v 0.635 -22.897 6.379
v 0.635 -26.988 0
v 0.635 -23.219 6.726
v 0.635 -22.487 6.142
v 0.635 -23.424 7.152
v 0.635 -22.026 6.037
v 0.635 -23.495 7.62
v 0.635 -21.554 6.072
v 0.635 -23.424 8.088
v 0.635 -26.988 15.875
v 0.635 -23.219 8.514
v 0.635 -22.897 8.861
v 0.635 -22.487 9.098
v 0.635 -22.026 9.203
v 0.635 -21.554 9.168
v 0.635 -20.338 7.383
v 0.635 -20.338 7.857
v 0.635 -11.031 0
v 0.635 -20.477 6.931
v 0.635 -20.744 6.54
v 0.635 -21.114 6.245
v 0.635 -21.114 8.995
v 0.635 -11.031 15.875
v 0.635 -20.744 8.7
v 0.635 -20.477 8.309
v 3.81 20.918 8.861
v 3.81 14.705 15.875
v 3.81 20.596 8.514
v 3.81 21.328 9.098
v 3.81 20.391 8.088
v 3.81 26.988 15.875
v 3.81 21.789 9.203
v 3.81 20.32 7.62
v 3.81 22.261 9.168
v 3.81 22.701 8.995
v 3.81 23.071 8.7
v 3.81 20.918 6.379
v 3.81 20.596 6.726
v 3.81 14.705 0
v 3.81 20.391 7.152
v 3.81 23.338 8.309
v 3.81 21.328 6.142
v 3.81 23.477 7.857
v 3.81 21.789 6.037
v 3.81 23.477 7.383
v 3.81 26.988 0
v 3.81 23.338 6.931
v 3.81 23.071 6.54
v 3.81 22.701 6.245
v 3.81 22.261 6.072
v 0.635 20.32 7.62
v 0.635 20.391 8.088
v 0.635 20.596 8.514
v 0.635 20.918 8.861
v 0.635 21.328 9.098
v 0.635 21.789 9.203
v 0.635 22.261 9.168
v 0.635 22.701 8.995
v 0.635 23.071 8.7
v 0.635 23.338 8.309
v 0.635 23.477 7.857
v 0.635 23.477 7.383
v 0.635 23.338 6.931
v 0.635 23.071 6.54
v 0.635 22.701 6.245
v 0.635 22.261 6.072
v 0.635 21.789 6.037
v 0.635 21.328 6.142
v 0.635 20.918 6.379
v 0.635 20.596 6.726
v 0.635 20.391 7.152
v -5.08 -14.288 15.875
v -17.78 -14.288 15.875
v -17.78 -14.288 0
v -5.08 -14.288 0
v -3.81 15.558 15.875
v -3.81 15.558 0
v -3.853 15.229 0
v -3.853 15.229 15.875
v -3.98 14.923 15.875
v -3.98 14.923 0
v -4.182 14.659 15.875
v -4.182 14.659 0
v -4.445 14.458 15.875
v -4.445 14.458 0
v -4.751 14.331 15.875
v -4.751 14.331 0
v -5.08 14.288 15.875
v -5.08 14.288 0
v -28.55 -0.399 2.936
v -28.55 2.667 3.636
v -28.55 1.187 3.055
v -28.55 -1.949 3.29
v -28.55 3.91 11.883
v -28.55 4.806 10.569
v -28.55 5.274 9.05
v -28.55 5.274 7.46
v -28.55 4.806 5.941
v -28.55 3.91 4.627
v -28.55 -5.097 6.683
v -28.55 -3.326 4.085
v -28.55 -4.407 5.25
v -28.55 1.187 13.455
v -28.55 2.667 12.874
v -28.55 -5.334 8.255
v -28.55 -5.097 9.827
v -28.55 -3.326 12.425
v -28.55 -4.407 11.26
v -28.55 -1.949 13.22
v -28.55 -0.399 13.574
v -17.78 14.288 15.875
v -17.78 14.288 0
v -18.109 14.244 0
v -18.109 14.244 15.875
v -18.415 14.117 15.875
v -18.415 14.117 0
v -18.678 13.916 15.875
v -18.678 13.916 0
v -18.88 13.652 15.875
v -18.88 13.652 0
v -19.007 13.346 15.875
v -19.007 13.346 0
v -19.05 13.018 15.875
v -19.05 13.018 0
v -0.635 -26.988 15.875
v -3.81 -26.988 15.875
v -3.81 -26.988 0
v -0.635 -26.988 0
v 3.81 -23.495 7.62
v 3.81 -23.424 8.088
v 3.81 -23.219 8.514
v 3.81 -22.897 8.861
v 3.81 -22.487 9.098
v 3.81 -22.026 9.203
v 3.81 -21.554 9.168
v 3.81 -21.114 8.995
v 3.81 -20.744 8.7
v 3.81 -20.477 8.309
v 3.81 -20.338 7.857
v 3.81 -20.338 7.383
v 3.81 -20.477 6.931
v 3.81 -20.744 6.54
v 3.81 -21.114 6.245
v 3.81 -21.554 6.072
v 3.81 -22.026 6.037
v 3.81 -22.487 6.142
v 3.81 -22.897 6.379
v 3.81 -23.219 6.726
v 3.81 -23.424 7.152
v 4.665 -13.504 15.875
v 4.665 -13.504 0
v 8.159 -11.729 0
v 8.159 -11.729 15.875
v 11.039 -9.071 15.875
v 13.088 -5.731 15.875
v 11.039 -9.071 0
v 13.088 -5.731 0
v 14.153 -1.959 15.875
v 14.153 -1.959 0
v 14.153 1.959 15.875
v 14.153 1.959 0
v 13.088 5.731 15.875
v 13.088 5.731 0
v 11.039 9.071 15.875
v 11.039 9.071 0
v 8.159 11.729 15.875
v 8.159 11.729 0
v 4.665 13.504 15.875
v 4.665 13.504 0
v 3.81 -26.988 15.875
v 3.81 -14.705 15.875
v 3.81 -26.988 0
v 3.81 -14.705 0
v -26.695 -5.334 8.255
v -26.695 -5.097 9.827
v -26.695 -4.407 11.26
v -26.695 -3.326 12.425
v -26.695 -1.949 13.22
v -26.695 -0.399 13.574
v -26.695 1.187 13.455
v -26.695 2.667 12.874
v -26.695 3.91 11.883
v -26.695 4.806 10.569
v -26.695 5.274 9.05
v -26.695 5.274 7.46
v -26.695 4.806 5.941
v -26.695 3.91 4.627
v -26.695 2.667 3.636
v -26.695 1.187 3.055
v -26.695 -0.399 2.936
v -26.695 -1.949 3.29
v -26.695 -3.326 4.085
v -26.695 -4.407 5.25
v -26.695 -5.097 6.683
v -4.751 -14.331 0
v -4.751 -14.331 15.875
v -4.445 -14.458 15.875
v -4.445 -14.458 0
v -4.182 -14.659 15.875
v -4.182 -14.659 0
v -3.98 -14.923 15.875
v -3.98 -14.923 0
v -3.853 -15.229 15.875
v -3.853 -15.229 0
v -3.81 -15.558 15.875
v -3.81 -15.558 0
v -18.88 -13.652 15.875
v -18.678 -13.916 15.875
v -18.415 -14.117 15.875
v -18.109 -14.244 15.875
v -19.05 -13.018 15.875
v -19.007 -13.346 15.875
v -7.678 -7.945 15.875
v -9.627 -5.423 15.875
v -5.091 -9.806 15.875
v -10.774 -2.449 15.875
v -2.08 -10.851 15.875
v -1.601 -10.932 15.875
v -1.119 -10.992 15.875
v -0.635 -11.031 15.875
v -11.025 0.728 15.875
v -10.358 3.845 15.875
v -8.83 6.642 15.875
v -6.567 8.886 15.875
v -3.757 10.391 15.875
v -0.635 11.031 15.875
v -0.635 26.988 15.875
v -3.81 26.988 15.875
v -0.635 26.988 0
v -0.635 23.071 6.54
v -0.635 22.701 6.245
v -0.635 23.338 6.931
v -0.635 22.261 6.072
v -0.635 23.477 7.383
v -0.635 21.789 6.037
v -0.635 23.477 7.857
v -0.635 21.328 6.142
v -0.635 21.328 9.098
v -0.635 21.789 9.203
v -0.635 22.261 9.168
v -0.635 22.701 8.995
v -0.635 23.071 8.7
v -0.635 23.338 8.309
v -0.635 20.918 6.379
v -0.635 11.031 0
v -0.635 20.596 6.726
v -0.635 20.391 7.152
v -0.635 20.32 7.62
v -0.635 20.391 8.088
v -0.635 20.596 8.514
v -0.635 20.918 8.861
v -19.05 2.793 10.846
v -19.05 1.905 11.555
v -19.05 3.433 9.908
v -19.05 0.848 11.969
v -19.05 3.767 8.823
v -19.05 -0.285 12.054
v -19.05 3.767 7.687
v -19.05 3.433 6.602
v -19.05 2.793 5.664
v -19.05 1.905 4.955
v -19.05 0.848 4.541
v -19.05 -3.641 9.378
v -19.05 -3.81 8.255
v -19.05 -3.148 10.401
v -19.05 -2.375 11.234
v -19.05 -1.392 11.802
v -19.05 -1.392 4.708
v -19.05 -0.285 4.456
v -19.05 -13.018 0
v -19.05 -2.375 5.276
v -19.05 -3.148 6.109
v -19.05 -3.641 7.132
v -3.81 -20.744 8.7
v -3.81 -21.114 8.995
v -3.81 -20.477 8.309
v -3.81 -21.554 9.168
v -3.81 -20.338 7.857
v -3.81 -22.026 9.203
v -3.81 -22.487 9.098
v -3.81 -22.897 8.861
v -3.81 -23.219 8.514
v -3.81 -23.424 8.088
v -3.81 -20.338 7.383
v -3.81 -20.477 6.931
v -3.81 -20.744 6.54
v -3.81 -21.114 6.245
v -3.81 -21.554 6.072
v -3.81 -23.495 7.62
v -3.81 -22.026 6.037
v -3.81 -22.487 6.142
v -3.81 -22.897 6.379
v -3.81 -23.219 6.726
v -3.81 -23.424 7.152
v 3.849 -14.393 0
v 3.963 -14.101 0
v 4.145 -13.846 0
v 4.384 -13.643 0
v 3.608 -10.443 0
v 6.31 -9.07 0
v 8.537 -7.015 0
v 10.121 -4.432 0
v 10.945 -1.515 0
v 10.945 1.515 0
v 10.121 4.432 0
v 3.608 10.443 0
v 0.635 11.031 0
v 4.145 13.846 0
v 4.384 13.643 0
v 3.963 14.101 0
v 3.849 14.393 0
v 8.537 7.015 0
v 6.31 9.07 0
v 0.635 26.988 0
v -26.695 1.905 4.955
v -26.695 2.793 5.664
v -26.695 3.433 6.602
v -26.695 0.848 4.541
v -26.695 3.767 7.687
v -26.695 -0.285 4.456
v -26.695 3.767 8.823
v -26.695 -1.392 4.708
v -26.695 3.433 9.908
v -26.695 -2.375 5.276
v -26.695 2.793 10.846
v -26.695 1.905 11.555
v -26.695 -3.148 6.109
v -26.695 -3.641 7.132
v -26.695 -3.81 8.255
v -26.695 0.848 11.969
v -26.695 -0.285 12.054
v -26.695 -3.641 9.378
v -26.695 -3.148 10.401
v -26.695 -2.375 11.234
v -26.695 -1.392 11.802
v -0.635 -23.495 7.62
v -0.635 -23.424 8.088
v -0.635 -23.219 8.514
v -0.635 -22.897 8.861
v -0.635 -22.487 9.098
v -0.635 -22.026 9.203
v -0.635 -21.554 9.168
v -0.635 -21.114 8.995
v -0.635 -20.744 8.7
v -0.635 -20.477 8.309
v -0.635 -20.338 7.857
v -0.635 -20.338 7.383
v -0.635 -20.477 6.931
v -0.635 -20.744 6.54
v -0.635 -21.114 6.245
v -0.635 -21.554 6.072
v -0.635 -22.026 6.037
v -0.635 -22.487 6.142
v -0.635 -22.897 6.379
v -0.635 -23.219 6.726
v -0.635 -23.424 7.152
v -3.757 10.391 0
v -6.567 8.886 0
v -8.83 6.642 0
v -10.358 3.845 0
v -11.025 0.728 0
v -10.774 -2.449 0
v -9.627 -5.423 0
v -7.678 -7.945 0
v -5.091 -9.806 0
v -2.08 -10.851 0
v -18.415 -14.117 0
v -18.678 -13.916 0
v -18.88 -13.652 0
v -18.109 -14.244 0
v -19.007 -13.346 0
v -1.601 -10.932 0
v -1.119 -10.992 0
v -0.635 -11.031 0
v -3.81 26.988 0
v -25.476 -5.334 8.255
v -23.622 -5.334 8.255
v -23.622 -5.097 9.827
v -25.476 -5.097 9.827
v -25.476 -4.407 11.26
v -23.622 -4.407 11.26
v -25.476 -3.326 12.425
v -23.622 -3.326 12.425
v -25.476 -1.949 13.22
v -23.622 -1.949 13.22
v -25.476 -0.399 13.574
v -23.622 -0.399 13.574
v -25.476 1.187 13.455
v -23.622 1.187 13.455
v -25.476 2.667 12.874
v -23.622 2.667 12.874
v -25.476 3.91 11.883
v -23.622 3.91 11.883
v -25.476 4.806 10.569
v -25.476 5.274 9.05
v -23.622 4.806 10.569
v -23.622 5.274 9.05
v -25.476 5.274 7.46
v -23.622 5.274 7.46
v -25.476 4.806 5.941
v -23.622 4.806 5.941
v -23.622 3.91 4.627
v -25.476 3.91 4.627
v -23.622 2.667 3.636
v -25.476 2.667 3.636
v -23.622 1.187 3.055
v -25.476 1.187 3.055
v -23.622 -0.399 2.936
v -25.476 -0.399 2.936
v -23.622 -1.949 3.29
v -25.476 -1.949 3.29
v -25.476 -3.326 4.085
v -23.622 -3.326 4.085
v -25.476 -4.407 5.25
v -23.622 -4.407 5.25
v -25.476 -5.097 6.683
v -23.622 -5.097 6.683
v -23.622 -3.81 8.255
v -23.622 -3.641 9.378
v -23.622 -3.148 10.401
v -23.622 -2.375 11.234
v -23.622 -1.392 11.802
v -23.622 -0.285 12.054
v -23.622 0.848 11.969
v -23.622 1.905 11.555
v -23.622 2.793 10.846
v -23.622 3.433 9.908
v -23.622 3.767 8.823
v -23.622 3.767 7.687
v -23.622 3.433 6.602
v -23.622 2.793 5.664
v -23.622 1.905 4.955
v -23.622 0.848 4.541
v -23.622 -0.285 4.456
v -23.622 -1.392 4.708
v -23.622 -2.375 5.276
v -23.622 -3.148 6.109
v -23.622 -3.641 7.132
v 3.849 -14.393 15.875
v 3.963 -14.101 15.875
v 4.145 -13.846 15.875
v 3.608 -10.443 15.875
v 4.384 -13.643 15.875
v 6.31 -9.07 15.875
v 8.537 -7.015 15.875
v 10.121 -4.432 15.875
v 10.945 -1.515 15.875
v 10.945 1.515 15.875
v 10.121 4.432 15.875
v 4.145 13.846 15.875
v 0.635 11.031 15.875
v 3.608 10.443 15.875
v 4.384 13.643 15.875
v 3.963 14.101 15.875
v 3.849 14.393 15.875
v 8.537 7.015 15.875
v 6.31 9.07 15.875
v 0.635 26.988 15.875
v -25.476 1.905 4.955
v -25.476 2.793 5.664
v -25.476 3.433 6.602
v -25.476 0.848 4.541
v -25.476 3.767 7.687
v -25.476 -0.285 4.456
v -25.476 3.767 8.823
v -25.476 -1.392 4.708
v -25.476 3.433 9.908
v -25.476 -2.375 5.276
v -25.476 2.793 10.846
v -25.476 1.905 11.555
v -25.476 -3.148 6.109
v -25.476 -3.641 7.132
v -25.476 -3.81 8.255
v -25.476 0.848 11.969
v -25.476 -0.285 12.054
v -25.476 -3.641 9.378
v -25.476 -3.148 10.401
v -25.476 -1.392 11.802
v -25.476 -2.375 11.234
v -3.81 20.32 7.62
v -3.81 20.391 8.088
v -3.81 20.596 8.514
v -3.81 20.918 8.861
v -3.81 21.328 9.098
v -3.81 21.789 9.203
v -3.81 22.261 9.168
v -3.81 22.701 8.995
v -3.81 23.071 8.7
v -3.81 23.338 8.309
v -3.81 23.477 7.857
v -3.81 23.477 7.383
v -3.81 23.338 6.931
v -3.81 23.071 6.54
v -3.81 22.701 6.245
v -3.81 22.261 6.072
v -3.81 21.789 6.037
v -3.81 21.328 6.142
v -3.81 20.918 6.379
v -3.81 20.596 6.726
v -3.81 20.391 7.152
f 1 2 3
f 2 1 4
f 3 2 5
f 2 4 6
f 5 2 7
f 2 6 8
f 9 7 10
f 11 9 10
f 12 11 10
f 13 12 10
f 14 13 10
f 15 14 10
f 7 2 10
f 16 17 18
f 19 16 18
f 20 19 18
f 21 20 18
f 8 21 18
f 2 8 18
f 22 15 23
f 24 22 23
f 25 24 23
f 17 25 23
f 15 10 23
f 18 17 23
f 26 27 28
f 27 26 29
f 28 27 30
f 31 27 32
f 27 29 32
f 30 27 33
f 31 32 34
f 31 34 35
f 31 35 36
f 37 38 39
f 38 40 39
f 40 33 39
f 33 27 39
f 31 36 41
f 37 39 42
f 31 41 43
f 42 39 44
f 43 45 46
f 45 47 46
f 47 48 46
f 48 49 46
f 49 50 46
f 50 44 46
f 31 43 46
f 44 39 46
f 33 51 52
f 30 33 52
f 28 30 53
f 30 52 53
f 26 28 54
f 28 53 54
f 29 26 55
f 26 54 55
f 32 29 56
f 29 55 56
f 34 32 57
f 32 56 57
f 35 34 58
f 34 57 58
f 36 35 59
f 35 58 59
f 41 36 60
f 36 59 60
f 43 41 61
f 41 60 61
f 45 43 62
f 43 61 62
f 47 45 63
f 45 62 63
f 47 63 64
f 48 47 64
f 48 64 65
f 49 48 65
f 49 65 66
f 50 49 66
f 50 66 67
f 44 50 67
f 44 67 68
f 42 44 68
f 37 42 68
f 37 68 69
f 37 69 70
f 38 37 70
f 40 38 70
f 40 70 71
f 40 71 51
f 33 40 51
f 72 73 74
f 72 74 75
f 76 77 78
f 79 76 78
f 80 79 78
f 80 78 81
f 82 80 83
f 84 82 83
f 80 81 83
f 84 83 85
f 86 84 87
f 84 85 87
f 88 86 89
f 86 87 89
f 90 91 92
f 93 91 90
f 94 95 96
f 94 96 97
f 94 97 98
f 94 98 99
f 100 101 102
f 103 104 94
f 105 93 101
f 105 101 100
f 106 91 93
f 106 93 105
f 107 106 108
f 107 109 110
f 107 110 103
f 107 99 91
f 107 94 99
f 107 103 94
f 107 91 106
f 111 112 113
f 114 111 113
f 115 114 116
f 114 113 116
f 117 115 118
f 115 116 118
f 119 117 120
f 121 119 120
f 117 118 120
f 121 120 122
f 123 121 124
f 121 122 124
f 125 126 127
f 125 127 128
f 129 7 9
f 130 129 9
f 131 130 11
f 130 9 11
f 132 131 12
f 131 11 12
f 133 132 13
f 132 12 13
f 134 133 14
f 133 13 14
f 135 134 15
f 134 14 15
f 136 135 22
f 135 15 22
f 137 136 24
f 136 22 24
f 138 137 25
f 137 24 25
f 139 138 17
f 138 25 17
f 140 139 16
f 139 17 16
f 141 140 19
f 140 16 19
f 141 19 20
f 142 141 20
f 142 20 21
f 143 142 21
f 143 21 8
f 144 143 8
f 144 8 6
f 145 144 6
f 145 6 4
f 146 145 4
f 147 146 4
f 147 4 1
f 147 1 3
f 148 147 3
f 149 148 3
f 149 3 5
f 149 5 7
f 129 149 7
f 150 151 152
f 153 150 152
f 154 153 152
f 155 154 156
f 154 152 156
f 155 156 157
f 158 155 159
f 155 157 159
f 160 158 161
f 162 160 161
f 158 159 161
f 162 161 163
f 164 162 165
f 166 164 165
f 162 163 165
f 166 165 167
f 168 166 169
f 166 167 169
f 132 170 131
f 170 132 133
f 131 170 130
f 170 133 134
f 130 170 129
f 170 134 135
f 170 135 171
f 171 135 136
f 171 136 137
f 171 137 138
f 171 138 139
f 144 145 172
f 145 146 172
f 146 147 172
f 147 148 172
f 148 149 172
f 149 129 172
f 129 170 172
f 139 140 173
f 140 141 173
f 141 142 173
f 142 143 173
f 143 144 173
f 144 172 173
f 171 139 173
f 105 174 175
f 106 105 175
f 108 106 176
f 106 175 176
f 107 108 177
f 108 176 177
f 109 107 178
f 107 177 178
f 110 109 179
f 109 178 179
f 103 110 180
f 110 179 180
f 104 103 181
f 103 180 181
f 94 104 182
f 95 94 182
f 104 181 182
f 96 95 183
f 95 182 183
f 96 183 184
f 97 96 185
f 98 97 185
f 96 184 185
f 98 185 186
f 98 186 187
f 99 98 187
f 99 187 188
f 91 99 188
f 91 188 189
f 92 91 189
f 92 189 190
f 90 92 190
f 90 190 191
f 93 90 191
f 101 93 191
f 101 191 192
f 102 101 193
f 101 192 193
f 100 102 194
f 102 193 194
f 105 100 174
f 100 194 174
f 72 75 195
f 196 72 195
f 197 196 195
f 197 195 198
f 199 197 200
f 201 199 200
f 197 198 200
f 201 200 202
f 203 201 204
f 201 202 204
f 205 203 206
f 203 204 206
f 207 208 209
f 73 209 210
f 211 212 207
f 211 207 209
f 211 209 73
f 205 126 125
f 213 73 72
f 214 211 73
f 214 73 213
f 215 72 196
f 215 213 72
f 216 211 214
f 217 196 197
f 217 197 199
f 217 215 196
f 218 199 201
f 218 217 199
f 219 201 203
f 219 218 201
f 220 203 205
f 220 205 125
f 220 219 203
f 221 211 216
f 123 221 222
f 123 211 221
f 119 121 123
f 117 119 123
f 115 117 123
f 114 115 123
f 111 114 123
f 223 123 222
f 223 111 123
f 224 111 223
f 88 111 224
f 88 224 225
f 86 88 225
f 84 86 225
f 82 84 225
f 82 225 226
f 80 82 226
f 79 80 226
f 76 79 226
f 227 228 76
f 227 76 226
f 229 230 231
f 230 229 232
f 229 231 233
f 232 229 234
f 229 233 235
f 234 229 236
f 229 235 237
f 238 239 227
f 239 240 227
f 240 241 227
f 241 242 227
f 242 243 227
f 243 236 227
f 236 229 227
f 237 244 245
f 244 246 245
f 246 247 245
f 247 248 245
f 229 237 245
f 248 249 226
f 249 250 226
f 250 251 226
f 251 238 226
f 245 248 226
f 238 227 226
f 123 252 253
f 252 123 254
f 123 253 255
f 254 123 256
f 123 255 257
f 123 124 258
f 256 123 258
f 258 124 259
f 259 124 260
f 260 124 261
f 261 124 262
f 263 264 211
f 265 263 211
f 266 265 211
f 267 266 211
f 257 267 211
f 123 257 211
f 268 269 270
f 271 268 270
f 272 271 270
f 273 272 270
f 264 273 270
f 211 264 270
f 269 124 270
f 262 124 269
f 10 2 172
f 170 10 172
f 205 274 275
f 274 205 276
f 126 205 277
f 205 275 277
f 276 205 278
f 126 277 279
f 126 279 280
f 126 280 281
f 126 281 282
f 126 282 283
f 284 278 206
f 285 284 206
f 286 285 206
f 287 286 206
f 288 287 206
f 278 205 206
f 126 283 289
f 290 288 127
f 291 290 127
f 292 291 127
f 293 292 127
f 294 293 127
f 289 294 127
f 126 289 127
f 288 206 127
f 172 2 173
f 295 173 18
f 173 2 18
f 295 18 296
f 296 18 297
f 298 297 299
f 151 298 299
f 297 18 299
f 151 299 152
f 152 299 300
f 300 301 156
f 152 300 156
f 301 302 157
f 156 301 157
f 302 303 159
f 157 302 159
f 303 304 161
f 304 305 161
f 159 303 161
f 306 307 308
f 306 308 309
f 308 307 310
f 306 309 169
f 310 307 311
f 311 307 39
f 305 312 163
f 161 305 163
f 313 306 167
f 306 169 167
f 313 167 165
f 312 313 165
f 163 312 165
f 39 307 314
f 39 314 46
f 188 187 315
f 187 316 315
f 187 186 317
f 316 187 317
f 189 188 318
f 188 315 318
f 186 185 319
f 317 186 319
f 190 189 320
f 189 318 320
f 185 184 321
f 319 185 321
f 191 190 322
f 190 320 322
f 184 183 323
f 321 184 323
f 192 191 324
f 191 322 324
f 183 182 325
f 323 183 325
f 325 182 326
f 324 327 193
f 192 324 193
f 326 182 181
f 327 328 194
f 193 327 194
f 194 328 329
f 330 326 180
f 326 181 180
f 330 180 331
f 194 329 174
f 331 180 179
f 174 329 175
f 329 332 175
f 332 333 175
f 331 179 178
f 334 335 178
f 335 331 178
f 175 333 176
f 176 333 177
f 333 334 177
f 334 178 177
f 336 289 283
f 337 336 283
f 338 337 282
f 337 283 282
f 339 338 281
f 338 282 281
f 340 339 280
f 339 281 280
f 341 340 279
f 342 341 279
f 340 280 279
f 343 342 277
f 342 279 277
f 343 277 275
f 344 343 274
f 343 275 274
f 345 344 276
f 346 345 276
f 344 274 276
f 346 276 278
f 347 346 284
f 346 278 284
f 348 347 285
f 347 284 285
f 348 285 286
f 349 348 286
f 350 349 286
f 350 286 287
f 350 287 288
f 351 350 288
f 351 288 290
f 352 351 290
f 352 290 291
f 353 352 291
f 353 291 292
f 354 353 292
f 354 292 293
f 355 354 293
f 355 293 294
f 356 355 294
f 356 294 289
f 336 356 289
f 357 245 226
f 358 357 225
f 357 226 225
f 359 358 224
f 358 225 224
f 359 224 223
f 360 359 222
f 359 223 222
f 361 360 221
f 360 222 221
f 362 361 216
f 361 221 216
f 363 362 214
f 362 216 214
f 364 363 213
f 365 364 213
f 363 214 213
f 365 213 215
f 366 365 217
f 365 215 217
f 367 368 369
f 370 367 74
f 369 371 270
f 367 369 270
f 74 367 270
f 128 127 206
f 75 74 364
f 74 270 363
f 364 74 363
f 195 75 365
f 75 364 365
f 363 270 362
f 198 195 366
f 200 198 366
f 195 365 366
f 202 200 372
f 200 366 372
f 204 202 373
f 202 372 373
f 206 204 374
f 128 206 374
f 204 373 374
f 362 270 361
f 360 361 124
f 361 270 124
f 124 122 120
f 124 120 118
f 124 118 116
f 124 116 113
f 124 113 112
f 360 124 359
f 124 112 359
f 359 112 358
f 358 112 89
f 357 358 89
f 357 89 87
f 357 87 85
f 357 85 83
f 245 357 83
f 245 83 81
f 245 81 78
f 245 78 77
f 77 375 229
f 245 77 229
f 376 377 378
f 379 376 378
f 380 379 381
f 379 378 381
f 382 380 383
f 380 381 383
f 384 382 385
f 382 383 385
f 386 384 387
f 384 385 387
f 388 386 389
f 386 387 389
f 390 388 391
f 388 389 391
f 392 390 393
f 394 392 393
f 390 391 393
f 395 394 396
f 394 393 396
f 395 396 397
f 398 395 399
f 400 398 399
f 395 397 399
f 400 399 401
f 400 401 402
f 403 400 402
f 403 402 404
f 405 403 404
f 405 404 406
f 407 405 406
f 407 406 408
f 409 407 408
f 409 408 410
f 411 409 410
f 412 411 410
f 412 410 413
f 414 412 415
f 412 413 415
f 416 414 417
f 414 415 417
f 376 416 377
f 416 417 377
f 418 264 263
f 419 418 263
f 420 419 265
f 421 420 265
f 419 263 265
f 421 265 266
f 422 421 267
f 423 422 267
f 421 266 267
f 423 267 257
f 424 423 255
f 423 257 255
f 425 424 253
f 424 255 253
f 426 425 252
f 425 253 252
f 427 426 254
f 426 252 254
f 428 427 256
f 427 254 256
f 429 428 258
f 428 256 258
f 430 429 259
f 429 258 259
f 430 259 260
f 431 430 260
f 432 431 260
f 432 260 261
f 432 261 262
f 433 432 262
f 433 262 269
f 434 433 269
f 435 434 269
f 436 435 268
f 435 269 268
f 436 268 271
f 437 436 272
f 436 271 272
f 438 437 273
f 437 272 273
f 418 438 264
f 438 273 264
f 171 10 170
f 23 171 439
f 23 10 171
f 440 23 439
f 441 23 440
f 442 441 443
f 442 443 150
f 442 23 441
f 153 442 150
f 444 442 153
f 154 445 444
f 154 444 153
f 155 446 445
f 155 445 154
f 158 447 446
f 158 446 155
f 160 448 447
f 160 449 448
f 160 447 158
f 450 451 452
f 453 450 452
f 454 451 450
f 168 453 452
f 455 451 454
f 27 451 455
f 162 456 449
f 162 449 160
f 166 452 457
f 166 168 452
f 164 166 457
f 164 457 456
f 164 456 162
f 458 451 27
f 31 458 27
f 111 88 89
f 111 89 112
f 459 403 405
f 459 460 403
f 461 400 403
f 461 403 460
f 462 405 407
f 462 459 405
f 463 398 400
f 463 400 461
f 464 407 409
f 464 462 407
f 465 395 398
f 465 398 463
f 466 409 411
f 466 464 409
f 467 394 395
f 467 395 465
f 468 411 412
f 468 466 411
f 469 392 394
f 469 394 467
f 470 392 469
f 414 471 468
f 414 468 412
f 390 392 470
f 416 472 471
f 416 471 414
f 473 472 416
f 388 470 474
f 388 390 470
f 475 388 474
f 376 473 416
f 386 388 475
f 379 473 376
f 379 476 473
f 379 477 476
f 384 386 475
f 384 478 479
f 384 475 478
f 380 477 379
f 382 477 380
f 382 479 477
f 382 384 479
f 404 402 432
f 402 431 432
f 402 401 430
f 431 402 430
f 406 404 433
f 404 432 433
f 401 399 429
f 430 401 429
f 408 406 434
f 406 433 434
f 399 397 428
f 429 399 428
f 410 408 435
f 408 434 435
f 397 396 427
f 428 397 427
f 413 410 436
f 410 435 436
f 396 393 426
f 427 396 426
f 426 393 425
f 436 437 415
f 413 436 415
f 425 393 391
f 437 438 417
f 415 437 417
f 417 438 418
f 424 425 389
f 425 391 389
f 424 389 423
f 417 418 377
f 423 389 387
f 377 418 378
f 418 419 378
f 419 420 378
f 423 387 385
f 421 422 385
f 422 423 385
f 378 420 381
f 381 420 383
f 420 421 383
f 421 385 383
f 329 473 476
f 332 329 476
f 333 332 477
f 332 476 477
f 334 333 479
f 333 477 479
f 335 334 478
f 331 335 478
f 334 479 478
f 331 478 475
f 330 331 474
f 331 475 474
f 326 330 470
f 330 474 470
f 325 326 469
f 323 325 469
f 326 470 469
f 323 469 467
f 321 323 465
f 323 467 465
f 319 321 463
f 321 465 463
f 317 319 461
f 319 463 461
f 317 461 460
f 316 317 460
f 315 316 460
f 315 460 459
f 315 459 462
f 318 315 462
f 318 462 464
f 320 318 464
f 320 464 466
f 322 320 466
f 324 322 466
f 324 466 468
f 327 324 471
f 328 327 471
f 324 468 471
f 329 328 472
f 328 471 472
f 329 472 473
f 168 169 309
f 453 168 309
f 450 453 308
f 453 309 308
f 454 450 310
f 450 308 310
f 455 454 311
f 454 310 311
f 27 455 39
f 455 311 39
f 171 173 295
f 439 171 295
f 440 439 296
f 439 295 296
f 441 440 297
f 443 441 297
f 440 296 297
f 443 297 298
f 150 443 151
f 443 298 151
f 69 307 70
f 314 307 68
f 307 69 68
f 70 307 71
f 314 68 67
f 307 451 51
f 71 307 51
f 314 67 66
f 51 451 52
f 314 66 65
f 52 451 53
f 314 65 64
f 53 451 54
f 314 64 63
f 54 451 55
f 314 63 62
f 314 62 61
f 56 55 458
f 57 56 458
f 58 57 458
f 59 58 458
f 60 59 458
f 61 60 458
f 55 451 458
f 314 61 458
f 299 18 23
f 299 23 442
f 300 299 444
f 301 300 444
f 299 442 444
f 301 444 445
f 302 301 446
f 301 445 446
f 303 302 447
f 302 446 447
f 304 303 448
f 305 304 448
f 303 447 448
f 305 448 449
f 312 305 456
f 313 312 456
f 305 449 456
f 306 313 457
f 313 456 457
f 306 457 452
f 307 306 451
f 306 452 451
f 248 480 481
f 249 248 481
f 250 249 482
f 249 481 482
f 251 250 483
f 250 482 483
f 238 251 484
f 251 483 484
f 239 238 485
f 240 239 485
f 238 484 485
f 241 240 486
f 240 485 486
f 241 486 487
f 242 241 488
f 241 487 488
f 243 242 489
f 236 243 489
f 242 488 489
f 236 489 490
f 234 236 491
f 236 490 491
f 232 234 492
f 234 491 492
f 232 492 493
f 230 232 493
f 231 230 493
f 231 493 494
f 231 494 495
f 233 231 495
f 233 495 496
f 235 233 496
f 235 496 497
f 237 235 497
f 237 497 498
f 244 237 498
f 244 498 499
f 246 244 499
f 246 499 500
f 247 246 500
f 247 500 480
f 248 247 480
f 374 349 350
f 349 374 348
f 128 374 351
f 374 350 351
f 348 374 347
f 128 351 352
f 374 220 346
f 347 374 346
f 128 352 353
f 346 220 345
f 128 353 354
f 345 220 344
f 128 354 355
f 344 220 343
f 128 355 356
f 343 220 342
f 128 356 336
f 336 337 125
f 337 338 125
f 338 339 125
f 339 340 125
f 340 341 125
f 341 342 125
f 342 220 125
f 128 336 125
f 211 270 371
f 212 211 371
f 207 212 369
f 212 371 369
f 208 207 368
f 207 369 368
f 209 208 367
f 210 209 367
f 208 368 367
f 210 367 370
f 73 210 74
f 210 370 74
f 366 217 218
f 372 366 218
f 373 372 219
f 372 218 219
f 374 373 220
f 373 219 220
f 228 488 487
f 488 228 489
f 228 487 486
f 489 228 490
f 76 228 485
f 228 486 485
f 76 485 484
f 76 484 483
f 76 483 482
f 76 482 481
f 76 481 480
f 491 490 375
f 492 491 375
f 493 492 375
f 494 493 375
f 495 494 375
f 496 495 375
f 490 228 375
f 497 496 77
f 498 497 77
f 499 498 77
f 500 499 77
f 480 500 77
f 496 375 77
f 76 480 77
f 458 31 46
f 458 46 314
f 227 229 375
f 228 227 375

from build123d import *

# Parameters (mm, degrees)
F1_DEPTH  = 15.875
F2_R      = 3.81
F3_DEPTH  = 4.572
F4_R      = 5.334
F5_DEPTH  = 1.8542
F6_R      = 3.81
F7_DEPTH  = 1.2192
F8_R      = 5.334
F9_DEPTH  = 1.8542
F10_R     = 1.5875
F11_DEPTH = 25.4
F12_R     = 1.5875
F13_DEPTH = 25.4
F15_DEPTH = 25.4


with BuildPart() as f1:
    # F0 (on Top) → F1 (new body)
    with BuildSketch(Plane.XY):
        with BuildLine():
            ThreePointArc((-3.81, 15.5575), (-4.1819743879, 14.6594743879), (-5.08, 14.2875))
            Line((-5.08, 14.2875), (-17.78, 14.2875))
            ThreePointArc((-17.78, 14.2875), (-18.6780256121, 13.9155256121), (-19.05, 13.0175))
            Line((-19.05, 13.0175), (-19.05, -13.0175))
            ThreePointArc((-19.05, -13.0175), (-18.6780256121, -13.9155256121), (-17.78, -14.2875))
            Line((-17.78, -14.2875), (-5.08, -14.2875))
            ThreePointArc((-5.08, -14.2875), (-4.1819743879, -14.6594743879), (-3.81, -15.5575))
            Line((-3.81, -15.5575), (-3.81, -26.9875))
            Line((-3.81, -26.9875), (3.81, -26.9875))
            Line((3.81, -26.9875), (3.81, -14.7047409447))
            ThreePointArc((3.81, -14.7047409447), (4.0456980072, -13.9677746037), (4.6653061224, -13.5043539288))
            ThreePointArc((4.6653061224, -13.5043539288), (14.2875, 0), (4.6653061224, 13.5043539288))
            ThreePointArc((4.6653061224, 13.5043539288), (4.0456980072, 13.9677746037), (3.81, 14.7047409447))
            Line((3.81, 14.7047409447), (3.81, 26.9875))
            Line((3.81, 26.9875), (-3.81, 26.9875))
            Line((-3.81, 26.9875), (-3.81, 15.5575))
        make_face()
    extrude(amount=F1_DEPTH)

    # F2 (on face) → F3 (join)
    with BuildSketch(Plane(origin=(-19.05, 0, 0), x_dir=(0, -1, 0), z_dir=(-1, 0, 0))):
        with Locations((0, 8.255)):
            Circle(F2_R)
    extrude(amount=F3_DEPTH)

    # F4 (on face) → F5 (join)
    with BuildSketch(Plane(origin=(-23.622, 0, 0), x_dir=(0, -1, 0), z_dir=(-1, 0, 0))):
        with Locations((0, 8.255)):
            Circle(F4_R)
    extrude(amount=F5_DEPTH)

    # F6 (on face) → F7 (join)
    with BuildSketch(Plane(origin=(-25.4762, 0, 0), x_dir=(0, -1, 0), z_dir=(-1, 0, 0))):
        with Locations((0, 8.255)):
            Circle(F6_R)
    extrude(amount=F7_DEPTH)

    # F8 (on face) → F9 (join)
    with BuildSketch(Plane(origin=(-26.6954, 0, 0), x_dir=(0, -1, 0), z_dir=(-1, 0, 0))):
        with Locations((0, 8.255)):
            Circle(F8_R)
    extrude(amount=F9_DEPTH)

    # F10 (on face) → F11 (cut)
    with BuildSketch(Plane(origin=(-3.81, 0, 0), x_dir=(0, -1, 0), z_dir=(-1, 0, 0))):
        with Locations((-21.9075, 7.62)):
            Circle(F10_R)
    extrude(amount=-F11_DEPTH, mode=Mode.SUBTRACT)

    # F12 (on face) → F13 (cut)
    with BuildSketch(Plane(origin=(-3.81, 0, 0), x_dir=(0, -1, 0), z_dir=(-1, 0, 0))):
        with Locations((21.9075, 7.62)):
            Circle(F12_R)
    extrude(amount=-F13_DEPTH, mode=Mode.SUBTRACT)

    # F14 (on face) → F15 (cut)
    with BuildSketch(Plane.XY.offset(15.875)):
        with BuildLine():
            Line((0.635, 31.973856169), (-0.635, 31.973856169))
            Line((-0.635, 31.973856169), (-0.635, 11.0307377813))
            ThreePointArc((-0.635, 11.0307377813), (-11.0249801068, 0.7281583924), (-2.0802331986, -10.8514068599))
            ThreePointArc((-2.0802331986, -10.8514068599), (-1.3605744101, -10.9649094057), (-0.635, -11.0307377813))
            Line((-0.635, -11.0307377813), (-0.635, -36.412394438))
            Line((-0.635, -36.412394438), (0.635, -36.412394438))
            Line((0.635, -36.412394438), (0.635, -11.0307377813))
            ThreePointArc((0.635, -11.0307377813), (11.049, 0), (0.635, 11.0307377813))
            Line((0.635, 11.0307377813), (0.635, 31.973856169))
        make_face()
    extrude(amount=-F15_DEPTH, mode=Mode.SUBTRACT)


solid = f1.part
